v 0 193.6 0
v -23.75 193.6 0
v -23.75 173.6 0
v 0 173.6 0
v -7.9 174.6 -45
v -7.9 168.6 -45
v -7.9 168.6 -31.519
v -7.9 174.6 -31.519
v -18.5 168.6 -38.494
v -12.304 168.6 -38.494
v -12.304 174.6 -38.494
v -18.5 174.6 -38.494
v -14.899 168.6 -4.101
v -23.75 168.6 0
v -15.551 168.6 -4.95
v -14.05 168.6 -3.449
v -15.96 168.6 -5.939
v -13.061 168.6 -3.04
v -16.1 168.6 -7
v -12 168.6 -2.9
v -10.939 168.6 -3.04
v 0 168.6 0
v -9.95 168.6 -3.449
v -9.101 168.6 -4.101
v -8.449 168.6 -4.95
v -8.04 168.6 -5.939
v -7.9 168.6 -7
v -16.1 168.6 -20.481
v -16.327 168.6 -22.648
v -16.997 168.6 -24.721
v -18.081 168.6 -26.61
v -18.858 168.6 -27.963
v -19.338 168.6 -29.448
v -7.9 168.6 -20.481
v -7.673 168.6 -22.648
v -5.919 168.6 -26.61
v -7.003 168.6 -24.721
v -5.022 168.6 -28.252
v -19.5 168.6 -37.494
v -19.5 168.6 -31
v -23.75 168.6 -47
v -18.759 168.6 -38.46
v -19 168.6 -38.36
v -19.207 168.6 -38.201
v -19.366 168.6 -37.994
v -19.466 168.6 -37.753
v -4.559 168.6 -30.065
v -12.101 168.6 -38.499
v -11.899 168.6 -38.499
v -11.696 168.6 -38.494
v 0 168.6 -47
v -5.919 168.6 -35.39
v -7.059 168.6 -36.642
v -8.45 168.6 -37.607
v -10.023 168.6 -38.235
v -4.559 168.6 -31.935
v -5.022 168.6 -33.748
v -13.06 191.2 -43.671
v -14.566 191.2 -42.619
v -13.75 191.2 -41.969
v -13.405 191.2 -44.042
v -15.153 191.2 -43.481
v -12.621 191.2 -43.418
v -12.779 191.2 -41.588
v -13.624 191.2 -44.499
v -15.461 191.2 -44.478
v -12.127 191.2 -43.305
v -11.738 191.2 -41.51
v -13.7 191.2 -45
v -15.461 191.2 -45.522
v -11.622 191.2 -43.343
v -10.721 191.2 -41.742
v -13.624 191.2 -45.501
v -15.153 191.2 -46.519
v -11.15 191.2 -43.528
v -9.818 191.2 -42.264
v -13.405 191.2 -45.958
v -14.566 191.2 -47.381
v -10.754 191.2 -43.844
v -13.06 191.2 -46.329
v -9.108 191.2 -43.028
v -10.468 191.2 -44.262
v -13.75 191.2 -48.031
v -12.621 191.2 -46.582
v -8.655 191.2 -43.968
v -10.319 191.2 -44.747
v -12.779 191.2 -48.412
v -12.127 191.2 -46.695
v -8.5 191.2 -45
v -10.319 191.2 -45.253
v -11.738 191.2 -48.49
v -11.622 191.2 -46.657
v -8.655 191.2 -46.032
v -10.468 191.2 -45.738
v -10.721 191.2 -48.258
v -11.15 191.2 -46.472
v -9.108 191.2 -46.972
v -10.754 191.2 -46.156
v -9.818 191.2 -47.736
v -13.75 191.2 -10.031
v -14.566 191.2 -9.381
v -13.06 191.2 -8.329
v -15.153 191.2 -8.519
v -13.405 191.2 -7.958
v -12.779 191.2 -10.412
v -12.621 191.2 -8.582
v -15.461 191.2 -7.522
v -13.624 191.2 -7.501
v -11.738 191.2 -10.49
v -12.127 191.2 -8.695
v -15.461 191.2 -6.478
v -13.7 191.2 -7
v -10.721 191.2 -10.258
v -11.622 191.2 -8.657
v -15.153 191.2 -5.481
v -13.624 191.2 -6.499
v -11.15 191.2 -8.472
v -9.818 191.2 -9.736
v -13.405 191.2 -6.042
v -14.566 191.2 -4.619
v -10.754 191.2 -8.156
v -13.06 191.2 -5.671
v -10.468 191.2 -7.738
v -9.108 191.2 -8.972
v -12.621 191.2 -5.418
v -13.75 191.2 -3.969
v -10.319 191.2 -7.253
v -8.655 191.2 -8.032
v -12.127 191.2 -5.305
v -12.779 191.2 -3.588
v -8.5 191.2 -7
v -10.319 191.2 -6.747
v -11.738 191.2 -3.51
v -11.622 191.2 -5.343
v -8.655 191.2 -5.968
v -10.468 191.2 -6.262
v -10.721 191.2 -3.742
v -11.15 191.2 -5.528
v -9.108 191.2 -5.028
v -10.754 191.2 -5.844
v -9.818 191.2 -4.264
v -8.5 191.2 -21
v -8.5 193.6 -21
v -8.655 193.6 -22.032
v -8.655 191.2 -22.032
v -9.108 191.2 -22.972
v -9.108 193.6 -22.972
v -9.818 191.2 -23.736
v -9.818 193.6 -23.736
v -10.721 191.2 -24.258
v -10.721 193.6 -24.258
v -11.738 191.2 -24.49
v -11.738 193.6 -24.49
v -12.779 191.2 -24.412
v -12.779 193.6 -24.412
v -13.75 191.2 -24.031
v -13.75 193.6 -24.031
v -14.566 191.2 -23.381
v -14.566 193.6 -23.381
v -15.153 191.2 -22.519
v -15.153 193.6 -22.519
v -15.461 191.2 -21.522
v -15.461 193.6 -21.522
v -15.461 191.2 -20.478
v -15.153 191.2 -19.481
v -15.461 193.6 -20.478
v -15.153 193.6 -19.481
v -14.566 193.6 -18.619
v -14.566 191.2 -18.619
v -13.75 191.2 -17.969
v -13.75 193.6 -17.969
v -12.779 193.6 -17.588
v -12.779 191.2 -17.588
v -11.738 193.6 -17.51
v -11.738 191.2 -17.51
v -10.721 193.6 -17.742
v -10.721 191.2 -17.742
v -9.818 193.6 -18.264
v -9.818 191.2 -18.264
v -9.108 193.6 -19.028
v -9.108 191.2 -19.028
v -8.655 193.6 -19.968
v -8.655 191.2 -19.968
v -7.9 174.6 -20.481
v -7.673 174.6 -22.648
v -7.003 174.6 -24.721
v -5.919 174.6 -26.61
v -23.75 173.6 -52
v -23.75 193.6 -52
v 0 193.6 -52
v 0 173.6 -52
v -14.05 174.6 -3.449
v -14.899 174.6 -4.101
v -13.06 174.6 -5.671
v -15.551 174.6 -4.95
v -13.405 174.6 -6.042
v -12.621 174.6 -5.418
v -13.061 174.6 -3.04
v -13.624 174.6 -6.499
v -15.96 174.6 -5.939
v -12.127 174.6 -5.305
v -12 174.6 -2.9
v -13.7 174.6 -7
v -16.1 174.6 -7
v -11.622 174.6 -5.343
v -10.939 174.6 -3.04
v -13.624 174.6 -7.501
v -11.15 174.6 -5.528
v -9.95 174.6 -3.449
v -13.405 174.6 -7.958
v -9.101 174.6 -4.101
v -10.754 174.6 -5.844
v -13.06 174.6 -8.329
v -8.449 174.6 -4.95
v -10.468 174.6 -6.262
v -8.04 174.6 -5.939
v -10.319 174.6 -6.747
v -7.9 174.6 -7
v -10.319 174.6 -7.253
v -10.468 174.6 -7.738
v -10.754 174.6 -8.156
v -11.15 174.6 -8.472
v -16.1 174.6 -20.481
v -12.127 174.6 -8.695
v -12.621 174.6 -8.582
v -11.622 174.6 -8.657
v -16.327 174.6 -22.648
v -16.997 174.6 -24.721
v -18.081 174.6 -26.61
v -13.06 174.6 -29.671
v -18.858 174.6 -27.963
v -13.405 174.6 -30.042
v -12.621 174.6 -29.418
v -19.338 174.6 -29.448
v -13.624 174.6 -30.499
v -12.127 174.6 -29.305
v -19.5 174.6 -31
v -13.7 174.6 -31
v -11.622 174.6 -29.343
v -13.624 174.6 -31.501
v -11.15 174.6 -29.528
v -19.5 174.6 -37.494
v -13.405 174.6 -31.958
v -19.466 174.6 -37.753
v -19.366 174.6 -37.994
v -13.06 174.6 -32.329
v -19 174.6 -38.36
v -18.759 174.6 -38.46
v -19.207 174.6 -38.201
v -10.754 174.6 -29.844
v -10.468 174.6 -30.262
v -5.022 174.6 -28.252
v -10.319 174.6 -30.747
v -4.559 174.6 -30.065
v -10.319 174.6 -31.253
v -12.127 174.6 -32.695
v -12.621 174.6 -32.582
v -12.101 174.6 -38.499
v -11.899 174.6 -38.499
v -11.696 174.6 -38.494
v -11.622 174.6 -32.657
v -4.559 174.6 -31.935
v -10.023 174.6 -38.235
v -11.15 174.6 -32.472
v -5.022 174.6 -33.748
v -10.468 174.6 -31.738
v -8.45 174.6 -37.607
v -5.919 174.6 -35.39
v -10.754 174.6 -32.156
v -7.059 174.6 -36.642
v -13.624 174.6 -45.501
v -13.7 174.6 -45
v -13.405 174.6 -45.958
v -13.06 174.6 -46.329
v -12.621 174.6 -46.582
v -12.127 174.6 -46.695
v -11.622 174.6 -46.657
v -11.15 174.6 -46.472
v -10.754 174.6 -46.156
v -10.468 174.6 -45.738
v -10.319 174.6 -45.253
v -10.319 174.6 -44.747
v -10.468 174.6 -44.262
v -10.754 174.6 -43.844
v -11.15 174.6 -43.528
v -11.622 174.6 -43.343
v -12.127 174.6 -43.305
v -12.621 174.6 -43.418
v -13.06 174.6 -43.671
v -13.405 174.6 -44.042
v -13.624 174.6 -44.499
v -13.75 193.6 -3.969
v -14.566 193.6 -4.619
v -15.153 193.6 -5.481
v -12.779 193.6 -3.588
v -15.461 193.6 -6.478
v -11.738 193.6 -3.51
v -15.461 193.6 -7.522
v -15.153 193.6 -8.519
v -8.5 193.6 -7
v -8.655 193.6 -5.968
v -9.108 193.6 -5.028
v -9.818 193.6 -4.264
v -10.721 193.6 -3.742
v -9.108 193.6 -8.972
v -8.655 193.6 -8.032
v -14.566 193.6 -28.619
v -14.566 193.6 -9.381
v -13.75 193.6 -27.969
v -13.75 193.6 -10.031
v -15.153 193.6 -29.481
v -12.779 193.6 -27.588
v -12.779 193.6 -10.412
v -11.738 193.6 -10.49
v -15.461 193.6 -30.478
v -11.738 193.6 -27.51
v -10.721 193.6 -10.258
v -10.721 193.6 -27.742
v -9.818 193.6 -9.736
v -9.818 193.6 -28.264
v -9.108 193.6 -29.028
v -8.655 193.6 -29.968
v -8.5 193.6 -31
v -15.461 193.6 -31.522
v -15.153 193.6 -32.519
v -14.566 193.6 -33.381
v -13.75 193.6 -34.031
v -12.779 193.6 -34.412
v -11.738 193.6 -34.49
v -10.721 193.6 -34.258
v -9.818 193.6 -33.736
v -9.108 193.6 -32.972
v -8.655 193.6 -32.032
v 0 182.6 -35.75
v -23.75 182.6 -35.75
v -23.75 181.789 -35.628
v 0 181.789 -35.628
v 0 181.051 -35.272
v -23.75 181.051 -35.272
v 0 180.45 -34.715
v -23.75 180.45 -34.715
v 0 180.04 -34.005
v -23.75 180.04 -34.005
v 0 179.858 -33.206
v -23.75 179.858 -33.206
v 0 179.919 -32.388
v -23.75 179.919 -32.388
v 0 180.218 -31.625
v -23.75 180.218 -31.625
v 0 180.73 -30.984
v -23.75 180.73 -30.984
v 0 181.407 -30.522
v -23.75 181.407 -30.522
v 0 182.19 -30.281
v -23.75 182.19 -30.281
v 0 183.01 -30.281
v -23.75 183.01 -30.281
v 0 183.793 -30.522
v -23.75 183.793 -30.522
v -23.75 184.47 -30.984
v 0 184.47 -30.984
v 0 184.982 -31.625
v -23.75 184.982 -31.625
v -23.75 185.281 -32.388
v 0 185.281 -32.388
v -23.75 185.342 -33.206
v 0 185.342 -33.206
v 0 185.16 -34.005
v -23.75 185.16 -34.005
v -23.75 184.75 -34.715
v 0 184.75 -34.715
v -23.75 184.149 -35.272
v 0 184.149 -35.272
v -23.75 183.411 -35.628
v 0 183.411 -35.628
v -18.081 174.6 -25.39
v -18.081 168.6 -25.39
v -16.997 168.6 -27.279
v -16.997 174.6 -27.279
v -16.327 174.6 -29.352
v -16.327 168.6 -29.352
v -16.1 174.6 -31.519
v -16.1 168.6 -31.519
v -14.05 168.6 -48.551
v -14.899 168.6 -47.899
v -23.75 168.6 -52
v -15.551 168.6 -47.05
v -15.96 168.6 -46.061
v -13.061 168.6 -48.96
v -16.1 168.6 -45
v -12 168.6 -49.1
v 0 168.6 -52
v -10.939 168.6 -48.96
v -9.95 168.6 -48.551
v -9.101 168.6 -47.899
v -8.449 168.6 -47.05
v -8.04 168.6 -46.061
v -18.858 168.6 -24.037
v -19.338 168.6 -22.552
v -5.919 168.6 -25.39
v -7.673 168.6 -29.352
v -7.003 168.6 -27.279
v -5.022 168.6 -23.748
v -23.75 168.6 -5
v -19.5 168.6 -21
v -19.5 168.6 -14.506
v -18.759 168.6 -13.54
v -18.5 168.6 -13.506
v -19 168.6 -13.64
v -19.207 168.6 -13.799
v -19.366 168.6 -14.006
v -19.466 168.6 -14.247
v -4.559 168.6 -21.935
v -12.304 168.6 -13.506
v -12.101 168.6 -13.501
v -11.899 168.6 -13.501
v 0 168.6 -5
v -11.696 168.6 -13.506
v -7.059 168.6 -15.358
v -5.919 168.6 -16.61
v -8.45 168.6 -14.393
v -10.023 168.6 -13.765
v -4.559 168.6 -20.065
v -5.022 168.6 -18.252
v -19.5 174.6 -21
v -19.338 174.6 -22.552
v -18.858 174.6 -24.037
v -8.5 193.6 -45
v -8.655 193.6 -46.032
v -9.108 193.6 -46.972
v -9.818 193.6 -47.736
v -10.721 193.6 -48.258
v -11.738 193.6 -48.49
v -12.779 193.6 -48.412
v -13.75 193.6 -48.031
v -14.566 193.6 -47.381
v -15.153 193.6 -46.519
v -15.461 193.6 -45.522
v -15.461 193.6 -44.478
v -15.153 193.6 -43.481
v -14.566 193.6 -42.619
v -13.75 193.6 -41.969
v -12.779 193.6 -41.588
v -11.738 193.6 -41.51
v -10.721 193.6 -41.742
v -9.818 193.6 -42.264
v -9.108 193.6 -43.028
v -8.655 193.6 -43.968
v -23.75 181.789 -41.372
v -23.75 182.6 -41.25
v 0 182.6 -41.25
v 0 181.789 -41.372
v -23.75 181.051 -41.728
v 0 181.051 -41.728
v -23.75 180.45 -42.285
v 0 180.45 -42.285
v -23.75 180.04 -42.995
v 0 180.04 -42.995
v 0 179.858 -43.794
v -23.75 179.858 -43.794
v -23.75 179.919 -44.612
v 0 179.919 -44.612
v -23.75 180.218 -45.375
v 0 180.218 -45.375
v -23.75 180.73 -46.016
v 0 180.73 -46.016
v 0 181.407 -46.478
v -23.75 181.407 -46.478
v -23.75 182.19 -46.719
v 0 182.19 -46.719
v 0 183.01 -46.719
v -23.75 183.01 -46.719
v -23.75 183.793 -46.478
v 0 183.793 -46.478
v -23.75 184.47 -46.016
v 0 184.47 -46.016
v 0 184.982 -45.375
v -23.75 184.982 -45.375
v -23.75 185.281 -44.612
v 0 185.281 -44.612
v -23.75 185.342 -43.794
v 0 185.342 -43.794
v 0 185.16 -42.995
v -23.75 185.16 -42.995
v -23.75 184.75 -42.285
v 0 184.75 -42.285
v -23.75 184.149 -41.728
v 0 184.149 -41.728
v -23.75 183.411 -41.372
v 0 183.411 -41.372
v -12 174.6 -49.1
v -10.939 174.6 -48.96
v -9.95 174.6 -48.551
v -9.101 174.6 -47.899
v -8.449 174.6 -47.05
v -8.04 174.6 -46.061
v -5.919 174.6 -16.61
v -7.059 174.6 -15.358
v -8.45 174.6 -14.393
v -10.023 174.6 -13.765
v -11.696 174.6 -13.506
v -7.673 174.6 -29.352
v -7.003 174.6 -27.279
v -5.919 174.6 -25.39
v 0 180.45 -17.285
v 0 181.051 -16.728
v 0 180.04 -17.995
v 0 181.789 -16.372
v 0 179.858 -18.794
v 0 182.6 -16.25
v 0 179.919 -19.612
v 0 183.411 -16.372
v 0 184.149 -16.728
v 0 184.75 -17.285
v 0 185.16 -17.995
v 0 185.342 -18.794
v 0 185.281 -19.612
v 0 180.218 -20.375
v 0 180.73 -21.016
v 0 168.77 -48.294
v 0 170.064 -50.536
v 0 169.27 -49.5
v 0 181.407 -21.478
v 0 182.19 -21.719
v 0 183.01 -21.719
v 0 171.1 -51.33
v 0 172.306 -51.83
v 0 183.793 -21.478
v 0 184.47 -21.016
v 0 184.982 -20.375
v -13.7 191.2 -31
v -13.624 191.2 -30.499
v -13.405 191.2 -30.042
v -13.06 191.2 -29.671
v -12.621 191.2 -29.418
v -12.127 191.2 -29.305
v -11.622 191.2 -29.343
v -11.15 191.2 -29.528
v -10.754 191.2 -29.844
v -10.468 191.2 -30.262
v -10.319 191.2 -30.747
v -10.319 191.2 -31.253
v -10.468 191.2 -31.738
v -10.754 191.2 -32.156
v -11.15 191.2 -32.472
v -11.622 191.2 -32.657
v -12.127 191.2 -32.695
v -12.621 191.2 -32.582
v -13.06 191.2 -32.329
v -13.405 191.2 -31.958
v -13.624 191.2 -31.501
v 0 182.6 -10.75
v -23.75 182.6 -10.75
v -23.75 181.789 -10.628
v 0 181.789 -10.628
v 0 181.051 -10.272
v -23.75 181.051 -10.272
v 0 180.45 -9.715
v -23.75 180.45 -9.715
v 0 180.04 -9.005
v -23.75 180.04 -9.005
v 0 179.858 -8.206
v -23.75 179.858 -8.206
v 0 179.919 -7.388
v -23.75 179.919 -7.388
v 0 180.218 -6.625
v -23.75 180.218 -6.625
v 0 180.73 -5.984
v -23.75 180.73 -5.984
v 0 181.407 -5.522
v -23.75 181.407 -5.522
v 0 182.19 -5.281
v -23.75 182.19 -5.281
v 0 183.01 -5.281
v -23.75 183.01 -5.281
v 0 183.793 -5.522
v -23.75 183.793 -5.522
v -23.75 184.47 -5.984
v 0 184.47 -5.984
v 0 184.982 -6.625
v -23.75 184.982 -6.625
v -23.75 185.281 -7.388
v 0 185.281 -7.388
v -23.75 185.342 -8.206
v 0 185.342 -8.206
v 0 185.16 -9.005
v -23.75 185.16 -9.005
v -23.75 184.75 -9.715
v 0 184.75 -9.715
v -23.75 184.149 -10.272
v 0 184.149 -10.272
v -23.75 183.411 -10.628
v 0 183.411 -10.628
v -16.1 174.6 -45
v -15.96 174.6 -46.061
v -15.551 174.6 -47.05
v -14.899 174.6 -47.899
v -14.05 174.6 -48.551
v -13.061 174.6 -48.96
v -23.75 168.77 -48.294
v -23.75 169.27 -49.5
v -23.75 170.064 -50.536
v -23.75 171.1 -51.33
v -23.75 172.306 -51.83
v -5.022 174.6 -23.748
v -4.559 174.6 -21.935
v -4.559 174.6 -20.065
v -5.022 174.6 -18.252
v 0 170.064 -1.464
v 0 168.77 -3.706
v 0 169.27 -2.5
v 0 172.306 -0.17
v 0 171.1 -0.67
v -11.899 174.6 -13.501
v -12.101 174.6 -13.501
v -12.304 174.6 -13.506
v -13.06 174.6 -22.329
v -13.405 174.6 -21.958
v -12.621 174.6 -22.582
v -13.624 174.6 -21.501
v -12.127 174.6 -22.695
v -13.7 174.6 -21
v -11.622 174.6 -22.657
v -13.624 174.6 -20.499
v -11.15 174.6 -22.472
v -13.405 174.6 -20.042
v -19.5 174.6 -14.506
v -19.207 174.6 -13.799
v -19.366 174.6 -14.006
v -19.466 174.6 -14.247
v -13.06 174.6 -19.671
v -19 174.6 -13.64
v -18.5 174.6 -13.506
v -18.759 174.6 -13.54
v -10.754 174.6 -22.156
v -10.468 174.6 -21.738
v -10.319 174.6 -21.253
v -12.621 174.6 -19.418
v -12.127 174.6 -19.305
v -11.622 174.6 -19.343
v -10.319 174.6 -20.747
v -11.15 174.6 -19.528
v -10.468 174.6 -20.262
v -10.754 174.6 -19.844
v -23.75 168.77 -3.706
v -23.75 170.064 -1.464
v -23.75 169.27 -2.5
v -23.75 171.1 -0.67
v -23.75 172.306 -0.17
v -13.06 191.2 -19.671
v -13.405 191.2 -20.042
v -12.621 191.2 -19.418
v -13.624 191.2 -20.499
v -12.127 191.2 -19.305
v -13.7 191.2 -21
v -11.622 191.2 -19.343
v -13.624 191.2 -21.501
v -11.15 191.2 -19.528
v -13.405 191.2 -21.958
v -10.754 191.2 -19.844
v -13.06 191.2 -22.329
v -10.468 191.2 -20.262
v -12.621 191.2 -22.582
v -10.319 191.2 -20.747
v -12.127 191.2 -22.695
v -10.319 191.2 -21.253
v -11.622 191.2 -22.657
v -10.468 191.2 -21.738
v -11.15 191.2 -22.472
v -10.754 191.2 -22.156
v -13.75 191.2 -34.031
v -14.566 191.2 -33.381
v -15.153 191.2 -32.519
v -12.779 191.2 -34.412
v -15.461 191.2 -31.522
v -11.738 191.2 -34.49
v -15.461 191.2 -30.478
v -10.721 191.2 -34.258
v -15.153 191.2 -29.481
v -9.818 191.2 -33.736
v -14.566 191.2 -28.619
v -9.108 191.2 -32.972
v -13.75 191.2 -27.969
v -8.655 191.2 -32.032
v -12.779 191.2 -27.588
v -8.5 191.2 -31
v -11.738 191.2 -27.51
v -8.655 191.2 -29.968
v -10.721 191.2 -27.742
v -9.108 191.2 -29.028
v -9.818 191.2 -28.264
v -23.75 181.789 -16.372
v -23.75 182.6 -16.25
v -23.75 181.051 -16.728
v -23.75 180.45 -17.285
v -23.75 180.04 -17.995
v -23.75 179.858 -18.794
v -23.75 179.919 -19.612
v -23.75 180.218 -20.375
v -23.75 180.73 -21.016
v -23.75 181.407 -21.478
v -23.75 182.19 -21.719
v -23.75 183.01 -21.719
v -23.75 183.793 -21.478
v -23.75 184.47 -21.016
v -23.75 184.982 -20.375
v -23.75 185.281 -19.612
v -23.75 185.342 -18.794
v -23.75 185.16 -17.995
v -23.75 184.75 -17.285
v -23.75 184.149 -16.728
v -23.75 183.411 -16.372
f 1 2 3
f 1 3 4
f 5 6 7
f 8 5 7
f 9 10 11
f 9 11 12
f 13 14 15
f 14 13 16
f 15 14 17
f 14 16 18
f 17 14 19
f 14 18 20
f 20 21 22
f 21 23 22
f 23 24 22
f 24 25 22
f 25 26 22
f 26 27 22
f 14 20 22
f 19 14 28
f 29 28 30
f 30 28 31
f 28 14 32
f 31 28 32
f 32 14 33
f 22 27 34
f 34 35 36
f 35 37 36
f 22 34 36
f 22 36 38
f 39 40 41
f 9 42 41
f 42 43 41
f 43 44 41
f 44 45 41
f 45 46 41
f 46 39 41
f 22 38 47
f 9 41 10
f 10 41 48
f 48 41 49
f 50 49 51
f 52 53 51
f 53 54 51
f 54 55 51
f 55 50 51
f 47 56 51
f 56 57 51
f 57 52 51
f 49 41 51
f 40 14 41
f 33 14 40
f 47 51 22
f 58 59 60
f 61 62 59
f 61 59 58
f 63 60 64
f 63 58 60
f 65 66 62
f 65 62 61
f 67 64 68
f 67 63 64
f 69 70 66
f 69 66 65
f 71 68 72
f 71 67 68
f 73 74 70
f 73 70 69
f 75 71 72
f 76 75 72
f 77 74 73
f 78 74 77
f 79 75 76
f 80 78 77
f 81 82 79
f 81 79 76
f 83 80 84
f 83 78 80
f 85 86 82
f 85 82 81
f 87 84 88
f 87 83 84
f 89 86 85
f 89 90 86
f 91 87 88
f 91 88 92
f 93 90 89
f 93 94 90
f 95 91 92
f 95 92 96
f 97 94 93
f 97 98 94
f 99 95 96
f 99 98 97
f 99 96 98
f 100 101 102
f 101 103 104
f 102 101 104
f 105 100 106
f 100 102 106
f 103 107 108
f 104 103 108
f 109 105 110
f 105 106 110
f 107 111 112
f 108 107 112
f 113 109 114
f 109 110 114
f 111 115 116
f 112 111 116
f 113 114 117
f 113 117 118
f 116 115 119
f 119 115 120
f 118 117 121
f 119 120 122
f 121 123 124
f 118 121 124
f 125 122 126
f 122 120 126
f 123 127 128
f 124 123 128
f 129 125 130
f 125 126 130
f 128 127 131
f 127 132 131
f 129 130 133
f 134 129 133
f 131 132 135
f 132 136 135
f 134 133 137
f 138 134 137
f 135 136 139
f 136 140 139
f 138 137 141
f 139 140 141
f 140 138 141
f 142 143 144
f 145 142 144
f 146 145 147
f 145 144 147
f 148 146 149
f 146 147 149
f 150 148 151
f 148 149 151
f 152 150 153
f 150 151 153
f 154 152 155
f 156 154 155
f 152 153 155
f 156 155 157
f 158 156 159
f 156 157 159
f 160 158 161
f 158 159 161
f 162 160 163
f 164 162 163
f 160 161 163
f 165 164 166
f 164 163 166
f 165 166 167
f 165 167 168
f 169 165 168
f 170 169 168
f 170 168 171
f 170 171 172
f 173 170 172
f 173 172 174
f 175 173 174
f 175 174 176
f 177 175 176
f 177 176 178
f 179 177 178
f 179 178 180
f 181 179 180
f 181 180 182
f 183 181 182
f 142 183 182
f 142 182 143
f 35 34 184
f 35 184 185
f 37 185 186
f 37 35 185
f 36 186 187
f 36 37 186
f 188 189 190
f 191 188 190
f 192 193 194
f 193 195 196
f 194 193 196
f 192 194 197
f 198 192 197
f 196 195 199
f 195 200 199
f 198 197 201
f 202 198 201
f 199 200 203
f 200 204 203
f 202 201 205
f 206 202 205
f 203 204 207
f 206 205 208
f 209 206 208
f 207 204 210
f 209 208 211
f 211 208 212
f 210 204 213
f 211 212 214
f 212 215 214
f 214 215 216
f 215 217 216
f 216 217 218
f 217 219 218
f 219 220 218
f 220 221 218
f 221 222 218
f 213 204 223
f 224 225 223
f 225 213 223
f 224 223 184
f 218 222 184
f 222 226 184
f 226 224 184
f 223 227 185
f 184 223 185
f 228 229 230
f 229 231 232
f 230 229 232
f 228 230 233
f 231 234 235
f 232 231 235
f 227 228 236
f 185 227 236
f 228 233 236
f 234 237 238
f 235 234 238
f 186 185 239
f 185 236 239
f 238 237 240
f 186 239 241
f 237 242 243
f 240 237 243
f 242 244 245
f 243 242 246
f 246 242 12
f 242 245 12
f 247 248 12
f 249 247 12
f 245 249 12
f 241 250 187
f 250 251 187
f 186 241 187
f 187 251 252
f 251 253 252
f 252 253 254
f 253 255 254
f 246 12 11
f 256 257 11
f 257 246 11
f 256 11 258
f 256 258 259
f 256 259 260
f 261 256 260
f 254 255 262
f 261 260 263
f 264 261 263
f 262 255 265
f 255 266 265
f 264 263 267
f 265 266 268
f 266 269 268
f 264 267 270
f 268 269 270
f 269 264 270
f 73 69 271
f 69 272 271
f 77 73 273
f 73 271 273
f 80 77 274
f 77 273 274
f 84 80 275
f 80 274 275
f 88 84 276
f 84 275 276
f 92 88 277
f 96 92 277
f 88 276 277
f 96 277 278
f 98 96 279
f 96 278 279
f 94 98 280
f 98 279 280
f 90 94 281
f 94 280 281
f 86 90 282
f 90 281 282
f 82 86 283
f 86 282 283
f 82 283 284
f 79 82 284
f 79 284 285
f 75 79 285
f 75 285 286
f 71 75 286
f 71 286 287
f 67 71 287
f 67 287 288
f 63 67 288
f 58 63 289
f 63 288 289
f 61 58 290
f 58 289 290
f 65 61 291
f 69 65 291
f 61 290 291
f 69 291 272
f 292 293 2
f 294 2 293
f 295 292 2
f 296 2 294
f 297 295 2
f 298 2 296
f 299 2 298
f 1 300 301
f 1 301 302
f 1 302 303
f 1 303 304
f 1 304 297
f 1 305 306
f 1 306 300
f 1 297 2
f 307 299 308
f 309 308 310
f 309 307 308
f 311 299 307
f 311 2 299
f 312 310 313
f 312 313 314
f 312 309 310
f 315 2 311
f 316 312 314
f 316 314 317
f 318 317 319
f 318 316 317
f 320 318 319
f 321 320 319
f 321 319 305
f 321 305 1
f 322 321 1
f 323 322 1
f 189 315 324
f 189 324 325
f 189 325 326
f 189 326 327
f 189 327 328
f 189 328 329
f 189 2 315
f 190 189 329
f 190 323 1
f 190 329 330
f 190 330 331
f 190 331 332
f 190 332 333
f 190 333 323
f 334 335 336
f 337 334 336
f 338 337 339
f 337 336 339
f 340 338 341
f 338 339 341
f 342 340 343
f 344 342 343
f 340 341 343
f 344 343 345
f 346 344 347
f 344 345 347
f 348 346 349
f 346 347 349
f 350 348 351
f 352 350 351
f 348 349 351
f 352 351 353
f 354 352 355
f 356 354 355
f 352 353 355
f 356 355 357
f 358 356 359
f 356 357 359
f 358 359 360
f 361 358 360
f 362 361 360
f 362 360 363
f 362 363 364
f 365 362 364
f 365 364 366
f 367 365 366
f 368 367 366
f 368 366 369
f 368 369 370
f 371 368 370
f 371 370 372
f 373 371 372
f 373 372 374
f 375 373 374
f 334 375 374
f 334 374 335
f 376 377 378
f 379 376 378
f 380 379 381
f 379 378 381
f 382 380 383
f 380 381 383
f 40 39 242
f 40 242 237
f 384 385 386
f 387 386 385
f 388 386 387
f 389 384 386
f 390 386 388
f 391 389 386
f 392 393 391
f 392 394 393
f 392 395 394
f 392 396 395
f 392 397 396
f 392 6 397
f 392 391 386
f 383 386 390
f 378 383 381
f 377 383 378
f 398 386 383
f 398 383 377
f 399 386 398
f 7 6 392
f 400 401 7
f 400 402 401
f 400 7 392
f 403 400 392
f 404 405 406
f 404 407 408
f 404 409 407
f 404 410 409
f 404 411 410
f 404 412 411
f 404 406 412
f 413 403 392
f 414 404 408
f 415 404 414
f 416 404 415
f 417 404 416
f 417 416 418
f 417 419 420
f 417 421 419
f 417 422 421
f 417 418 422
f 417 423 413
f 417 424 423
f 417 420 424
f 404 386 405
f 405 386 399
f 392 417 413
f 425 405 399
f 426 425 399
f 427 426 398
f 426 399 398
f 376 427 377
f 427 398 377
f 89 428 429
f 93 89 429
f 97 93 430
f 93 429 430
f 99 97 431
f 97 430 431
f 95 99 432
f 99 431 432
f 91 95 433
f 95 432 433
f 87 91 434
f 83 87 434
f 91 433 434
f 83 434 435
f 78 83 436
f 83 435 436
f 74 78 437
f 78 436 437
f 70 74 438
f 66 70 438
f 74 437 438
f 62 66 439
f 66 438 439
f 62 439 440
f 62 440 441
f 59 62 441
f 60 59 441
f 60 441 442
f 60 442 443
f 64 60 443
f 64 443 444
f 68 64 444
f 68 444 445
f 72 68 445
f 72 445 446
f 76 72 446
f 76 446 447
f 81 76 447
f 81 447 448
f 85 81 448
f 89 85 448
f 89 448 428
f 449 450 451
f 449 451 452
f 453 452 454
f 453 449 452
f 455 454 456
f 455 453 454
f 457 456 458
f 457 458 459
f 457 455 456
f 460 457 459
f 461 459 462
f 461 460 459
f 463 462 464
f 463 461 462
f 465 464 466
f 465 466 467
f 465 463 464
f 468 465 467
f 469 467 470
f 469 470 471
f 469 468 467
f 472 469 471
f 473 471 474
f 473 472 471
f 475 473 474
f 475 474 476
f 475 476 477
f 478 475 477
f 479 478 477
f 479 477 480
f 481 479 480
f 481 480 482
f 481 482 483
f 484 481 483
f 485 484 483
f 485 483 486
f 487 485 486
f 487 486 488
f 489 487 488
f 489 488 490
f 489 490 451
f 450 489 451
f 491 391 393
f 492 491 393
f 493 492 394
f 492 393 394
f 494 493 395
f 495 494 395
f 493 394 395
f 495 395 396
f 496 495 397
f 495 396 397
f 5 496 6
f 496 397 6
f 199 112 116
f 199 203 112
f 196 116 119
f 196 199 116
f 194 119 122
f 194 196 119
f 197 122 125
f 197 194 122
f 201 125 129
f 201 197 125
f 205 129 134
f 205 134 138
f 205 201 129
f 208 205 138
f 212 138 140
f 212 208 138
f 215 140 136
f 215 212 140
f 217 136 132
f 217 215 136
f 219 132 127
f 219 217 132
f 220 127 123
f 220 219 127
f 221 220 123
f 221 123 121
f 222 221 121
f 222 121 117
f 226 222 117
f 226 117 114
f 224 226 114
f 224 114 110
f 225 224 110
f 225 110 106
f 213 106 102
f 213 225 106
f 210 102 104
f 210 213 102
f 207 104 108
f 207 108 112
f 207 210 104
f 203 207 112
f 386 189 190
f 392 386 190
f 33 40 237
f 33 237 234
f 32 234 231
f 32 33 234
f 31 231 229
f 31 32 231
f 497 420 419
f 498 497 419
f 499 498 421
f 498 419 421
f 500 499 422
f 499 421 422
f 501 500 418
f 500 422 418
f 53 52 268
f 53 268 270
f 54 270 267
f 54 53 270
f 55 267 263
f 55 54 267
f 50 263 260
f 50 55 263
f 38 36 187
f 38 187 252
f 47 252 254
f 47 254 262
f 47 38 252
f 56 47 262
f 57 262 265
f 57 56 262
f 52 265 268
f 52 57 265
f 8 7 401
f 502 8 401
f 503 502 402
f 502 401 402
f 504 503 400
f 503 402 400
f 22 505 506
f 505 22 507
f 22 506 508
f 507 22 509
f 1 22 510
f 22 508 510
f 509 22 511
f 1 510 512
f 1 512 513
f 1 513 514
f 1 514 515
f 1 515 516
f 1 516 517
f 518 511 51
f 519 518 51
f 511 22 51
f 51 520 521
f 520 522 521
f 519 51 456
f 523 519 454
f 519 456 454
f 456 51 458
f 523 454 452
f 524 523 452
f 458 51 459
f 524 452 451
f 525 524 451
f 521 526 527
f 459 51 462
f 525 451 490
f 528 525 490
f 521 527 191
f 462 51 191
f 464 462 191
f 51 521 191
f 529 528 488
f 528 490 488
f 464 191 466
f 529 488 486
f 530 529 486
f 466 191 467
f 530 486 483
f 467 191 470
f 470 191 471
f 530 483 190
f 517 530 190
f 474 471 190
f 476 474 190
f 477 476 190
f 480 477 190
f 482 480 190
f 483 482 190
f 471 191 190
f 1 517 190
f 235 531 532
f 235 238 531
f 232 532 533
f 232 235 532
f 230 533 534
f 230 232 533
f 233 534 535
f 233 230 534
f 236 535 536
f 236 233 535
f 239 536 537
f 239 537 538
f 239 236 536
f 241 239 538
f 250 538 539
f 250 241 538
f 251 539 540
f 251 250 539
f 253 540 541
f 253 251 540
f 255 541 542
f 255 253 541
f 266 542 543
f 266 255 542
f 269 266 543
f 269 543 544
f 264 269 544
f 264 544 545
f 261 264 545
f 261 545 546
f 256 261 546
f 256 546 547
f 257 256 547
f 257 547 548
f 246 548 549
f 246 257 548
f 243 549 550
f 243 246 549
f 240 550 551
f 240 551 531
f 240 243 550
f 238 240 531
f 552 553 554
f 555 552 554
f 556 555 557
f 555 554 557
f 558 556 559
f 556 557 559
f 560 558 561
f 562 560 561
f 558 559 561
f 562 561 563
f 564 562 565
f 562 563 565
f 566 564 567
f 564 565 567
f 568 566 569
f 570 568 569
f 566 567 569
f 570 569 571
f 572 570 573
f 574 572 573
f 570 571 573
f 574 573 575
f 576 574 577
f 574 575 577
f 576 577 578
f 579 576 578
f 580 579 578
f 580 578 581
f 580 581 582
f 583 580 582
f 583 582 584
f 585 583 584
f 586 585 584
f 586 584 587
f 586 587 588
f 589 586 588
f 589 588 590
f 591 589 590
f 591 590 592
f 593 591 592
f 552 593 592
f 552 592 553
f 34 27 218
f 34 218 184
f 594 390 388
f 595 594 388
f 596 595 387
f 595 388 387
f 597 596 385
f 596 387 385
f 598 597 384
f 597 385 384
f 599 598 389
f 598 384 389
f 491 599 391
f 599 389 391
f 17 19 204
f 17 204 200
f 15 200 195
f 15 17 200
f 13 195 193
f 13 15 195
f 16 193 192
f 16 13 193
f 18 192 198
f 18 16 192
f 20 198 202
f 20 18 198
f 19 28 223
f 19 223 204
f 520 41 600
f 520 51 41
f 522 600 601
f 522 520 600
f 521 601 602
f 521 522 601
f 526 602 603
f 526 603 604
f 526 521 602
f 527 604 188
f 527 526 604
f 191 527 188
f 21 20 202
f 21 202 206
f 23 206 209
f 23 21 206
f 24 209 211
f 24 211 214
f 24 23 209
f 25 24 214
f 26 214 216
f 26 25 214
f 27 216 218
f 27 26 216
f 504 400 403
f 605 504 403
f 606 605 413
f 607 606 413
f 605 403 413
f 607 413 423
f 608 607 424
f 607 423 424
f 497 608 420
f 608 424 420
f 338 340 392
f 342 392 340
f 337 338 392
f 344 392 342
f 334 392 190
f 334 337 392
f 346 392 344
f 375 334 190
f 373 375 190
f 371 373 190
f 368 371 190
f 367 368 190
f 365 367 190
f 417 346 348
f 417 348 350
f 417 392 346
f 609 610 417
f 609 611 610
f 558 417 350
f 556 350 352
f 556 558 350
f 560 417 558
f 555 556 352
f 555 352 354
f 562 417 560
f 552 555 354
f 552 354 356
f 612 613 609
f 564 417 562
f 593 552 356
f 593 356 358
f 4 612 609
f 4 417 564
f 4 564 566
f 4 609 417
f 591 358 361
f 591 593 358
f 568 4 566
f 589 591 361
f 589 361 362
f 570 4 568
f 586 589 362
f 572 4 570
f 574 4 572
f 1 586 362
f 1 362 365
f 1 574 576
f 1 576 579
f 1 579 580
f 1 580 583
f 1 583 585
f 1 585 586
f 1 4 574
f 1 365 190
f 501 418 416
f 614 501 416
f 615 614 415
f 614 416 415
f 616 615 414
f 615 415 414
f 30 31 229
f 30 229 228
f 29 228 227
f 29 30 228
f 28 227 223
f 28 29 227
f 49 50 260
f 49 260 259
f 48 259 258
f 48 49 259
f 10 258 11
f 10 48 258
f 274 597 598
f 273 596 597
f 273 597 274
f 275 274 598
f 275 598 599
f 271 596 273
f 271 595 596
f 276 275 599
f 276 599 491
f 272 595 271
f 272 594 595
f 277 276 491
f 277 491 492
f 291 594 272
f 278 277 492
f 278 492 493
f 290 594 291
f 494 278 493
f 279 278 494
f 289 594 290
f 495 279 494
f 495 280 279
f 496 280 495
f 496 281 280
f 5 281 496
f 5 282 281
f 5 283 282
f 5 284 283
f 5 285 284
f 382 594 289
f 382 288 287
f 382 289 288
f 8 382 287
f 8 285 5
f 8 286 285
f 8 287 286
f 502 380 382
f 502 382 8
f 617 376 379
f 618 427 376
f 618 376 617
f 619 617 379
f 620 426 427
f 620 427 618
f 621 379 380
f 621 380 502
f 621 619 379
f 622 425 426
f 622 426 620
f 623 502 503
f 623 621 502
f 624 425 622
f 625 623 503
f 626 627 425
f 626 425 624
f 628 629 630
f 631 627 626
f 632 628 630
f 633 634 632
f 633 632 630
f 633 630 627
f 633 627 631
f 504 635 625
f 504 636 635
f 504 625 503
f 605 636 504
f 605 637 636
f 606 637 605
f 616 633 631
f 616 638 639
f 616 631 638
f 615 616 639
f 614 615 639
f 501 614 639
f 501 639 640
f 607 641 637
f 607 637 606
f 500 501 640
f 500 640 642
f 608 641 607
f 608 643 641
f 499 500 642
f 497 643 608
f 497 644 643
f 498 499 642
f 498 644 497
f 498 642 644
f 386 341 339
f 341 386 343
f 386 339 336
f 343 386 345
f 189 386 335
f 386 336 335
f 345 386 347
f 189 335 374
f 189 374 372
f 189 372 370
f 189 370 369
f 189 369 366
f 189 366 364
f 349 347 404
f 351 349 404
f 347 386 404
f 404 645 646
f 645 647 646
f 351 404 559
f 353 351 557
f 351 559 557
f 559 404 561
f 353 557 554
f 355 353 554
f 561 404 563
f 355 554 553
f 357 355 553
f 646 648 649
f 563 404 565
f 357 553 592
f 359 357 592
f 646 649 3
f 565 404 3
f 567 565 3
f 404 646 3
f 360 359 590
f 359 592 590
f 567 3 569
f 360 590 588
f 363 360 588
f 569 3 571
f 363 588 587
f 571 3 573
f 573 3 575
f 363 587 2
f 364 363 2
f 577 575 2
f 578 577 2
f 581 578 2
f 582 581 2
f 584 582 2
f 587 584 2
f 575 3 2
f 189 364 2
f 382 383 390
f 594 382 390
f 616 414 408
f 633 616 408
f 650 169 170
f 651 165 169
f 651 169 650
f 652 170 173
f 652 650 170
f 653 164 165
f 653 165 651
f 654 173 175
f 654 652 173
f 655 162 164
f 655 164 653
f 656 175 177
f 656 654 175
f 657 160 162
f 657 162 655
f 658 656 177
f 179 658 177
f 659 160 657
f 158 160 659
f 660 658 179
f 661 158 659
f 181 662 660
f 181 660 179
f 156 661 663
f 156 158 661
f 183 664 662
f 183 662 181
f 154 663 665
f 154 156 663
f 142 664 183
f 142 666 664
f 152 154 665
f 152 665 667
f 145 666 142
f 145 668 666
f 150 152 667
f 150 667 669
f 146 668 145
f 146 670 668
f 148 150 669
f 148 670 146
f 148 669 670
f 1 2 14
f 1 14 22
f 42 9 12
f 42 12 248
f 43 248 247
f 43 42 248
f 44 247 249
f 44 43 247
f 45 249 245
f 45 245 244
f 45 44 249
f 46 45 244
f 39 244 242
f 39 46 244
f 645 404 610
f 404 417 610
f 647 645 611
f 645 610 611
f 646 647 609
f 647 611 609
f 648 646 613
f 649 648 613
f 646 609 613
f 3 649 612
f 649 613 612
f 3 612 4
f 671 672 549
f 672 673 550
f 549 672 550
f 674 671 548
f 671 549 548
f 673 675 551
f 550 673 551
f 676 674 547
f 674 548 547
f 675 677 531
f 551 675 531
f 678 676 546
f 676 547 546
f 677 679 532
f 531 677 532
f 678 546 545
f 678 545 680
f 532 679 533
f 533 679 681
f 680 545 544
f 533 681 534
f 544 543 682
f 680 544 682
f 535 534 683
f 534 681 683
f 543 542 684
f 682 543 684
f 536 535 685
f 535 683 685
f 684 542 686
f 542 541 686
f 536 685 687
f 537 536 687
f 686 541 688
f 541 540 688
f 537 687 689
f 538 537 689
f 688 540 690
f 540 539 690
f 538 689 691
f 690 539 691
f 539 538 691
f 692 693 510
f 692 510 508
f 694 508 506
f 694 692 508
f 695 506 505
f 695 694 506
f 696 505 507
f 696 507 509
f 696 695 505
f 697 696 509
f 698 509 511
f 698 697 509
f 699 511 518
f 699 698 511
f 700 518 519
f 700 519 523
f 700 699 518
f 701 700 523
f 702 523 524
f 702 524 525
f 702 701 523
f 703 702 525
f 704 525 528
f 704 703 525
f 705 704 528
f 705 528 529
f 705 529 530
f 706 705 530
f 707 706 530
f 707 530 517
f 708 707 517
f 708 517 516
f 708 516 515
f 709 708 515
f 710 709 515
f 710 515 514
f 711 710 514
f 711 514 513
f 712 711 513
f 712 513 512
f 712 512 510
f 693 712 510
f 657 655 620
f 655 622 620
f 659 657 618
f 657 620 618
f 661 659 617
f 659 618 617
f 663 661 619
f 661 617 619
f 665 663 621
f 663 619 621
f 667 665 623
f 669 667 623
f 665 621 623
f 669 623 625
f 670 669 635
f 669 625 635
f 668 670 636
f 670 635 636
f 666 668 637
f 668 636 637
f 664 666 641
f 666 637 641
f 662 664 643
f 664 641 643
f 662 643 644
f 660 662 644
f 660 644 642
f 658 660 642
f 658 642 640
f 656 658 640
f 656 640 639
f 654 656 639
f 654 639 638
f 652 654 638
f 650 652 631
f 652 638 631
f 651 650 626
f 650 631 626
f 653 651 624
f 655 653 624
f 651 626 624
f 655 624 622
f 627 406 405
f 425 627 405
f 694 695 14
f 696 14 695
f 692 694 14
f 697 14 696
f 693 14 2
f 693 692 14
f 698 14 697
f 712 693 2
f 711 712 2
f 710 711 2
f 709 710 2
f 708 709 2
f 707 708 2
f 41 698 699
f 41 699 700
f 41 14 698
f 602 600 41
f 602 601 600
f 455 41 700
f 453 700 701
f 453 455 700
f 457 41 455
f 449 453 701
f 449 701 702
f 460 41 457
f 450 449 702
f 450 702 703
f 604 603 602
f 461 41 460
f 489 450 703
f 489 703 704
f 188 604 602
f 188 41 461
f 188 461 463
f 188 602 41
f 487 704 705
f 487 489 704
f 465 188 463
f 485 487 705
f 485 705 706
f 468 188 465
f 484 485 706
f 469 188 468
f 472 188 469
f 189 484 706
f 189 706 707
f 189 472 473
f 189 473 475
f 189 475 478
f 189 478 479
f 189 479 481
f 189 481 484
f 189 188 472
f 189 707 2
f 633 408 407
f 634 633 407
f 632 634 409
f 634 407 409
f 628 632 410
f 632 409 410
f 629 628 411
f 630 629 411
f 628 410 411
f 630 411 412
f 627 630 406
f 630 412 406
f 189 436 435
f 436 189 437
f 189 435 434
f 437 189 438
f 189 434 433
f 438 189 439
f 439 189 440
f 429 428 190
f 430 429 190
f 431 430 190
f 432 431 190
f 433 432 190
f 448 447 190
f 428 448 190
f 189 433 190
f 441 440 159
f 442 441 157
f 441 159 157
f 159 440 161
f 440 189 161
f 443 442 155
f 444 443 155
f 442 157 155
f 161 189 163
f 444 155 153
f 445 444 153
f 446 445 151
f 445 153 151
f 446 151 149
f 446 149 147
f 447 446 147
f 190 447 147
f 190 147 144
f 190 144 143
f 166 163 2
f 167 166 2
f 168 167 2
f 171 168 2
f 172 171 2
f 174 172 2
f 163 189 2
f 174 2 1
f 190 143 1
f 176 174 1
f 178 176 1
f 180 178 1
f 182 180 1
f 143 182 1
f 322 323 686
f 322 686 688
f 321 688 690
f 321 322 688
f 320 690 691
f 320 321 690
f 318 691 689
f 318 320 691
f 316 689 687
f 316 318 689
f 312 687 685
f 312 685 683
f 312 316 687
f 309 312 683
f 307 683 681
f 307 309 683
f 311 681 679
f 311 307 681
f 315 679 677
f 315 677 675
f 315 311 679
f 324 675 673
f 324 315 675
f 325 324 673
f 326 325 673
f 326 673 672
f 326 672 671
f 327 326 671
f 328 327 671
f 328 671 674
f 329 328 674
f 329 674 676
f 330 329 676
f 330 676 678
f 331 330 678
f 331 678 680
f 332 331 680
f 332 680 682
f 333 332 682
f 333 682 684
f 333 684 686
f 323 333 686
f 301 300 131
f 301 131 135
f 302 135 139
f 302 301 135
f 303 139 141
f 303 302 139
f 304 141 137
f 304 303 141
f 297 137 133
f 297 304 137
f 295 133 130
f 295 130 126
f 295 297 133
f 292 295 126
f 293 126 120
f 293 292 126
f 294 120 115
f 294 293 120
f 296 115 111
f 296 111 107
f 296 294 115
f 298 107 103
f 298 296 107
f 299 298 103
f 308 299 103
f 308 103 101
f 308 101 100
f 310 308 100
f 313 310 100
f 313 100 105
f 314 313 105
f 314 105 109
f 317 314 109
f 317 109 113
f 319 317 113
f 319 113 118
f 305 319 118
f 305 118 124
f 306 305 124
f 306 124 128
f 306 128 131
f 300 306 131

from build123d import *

# Parameters (mm, degrees)
ESQUISSE1_W                                        = 23.75
ESQUISSE1_H                                        = 25
BOSS_EXTRU_1_DEPTH                                 = 52
ENL_V_MAT_EXTRU_1_DEPTH                            = 6
CHAMBRAGE_POUR_VIS_T_TE_RONDE_BOMB_E_M_D           = 3.4
CHAMBRAGE_POUR_VIS_T_TE_RONDE_BOMB_E_M_CBORE_D     = 7
CHAMBRAGE_POUR_VIS_T_TE_RONDE_BOMB_E_M_CBORE_DEPTH = 2.4
D_GAGEMENT_M51_D                                   = 5.5
CONG_2_R                                           = 5


with BuildPart() as part:
    # Esquisse1 → Boss.-Extru.1 (new body)
    with BuildSketch(Plane.XY):
        with Locations((-11.875, 181.1)):
            Rectangle(ESQUISSE1_W, ESQUISSE1_H)
    extrude(amount=-BOSS_EXTRU_1_DEPTH)

    # Esquisse2 → Enlèv. mat.-Extru.1 (cut)
    with BuildSketch(Plane.XZ.offset(-168.6)):
        with BuildLine():
            Line((-12.304054054, -13.506165792), (-18.5, -13.506165792))
            ThreePointArc((-18.5, -13.506165792), (-19.207106781, -13.799059011), (-19.5, -14.506165792))
            Line((-19.5, -14.506165792), (-19.5, -21))
            ThreePointArc((-19.5, -21), (-19.13645949, -23.30671757), (-18.081081081, -25.389812398))
            ThreePointArc((-18.081081081, -25.389812398), (-16.607571798, -28.298209557), (-16.1, -31.518826659))
            Line((-16.1, -31.518826659), (-16.1, -45))
            ThreePointArc((-16.1, -45), (-14.899137803, -47.899137803), (-12, -49.1))
            ThreePointArc((-12, -49.1), (-9.100862197, -47.899137803), (-7.9, -45))
            Line((-7.9, -45), (-7.9, -31.518826659))
            ThreePointArc((-7.9, -31.518826659), (-7.392428202, -28.298209557), (-5.918918919, -25.389812398))
            ThreePointArc((-5.918918919, -25.389812398), (-4.5, -21), (-5.918918919, -16.610187602))
            ThreePointArc((-5.918918919, -16.610187602), (-8.450179508, -14.393278084), (-11.695945946, -13.506165792))
            ThreePointArc((-11.695945946, -13.506165792), (-12, -13.5), (-12.304054054, -13.506165792))
        make_face()
    extrude(amount=-ENL_V_MAT_EXTRU_1_DEPTH, mode=Mode.SUBTRACT)

    # Chambrage pour vis à tête ronde bombée M31 (through all)
    with Locations(Plane(origin=(0, 193.6, 0), x_dir=(1, 0, 0), z_dir=(0, 1, 0))):
        with Locations((-12, 21), (-12, 45)):
            CounterBoreHole(CHAMBRAGE_POUR_VIS_T_TE_RONDE_BOMB_E_M_D / 2, CHAMBRAGE_POUR_VIS_T_TE_RONDE_BOMB_E_M_CBORE_D / 2, CHAMBRAGE_POUR_VIS_T_TE_RONDE_BOMB_E_M_CBORE_DEPTH)

    # Dégagement M51 (through all)
    with Locations(Plane(origin=(0, 182.6, -8), x_dir=(0, 0, 1), z_dir=(1, 0, 0))):
        with Locations((0, 0), (-25, 0)):
            Hole(D_GAGEMENT_M51_D / 2)

    # Congé2
    cong_2_edges = [part.edges().sort_by_distance(p)[0] for p in [
        (-11.875, 168.6, 0),
    ]]
    fillet(cong_2_edges, radius=CONG_2_R)


with BuildPart() as body_2:
    # Symétrie1: mirrored copy
    add(part.part.mirror(Plane.XY.offset(-26)))


solid = Compound([part.part, body_2.part])
